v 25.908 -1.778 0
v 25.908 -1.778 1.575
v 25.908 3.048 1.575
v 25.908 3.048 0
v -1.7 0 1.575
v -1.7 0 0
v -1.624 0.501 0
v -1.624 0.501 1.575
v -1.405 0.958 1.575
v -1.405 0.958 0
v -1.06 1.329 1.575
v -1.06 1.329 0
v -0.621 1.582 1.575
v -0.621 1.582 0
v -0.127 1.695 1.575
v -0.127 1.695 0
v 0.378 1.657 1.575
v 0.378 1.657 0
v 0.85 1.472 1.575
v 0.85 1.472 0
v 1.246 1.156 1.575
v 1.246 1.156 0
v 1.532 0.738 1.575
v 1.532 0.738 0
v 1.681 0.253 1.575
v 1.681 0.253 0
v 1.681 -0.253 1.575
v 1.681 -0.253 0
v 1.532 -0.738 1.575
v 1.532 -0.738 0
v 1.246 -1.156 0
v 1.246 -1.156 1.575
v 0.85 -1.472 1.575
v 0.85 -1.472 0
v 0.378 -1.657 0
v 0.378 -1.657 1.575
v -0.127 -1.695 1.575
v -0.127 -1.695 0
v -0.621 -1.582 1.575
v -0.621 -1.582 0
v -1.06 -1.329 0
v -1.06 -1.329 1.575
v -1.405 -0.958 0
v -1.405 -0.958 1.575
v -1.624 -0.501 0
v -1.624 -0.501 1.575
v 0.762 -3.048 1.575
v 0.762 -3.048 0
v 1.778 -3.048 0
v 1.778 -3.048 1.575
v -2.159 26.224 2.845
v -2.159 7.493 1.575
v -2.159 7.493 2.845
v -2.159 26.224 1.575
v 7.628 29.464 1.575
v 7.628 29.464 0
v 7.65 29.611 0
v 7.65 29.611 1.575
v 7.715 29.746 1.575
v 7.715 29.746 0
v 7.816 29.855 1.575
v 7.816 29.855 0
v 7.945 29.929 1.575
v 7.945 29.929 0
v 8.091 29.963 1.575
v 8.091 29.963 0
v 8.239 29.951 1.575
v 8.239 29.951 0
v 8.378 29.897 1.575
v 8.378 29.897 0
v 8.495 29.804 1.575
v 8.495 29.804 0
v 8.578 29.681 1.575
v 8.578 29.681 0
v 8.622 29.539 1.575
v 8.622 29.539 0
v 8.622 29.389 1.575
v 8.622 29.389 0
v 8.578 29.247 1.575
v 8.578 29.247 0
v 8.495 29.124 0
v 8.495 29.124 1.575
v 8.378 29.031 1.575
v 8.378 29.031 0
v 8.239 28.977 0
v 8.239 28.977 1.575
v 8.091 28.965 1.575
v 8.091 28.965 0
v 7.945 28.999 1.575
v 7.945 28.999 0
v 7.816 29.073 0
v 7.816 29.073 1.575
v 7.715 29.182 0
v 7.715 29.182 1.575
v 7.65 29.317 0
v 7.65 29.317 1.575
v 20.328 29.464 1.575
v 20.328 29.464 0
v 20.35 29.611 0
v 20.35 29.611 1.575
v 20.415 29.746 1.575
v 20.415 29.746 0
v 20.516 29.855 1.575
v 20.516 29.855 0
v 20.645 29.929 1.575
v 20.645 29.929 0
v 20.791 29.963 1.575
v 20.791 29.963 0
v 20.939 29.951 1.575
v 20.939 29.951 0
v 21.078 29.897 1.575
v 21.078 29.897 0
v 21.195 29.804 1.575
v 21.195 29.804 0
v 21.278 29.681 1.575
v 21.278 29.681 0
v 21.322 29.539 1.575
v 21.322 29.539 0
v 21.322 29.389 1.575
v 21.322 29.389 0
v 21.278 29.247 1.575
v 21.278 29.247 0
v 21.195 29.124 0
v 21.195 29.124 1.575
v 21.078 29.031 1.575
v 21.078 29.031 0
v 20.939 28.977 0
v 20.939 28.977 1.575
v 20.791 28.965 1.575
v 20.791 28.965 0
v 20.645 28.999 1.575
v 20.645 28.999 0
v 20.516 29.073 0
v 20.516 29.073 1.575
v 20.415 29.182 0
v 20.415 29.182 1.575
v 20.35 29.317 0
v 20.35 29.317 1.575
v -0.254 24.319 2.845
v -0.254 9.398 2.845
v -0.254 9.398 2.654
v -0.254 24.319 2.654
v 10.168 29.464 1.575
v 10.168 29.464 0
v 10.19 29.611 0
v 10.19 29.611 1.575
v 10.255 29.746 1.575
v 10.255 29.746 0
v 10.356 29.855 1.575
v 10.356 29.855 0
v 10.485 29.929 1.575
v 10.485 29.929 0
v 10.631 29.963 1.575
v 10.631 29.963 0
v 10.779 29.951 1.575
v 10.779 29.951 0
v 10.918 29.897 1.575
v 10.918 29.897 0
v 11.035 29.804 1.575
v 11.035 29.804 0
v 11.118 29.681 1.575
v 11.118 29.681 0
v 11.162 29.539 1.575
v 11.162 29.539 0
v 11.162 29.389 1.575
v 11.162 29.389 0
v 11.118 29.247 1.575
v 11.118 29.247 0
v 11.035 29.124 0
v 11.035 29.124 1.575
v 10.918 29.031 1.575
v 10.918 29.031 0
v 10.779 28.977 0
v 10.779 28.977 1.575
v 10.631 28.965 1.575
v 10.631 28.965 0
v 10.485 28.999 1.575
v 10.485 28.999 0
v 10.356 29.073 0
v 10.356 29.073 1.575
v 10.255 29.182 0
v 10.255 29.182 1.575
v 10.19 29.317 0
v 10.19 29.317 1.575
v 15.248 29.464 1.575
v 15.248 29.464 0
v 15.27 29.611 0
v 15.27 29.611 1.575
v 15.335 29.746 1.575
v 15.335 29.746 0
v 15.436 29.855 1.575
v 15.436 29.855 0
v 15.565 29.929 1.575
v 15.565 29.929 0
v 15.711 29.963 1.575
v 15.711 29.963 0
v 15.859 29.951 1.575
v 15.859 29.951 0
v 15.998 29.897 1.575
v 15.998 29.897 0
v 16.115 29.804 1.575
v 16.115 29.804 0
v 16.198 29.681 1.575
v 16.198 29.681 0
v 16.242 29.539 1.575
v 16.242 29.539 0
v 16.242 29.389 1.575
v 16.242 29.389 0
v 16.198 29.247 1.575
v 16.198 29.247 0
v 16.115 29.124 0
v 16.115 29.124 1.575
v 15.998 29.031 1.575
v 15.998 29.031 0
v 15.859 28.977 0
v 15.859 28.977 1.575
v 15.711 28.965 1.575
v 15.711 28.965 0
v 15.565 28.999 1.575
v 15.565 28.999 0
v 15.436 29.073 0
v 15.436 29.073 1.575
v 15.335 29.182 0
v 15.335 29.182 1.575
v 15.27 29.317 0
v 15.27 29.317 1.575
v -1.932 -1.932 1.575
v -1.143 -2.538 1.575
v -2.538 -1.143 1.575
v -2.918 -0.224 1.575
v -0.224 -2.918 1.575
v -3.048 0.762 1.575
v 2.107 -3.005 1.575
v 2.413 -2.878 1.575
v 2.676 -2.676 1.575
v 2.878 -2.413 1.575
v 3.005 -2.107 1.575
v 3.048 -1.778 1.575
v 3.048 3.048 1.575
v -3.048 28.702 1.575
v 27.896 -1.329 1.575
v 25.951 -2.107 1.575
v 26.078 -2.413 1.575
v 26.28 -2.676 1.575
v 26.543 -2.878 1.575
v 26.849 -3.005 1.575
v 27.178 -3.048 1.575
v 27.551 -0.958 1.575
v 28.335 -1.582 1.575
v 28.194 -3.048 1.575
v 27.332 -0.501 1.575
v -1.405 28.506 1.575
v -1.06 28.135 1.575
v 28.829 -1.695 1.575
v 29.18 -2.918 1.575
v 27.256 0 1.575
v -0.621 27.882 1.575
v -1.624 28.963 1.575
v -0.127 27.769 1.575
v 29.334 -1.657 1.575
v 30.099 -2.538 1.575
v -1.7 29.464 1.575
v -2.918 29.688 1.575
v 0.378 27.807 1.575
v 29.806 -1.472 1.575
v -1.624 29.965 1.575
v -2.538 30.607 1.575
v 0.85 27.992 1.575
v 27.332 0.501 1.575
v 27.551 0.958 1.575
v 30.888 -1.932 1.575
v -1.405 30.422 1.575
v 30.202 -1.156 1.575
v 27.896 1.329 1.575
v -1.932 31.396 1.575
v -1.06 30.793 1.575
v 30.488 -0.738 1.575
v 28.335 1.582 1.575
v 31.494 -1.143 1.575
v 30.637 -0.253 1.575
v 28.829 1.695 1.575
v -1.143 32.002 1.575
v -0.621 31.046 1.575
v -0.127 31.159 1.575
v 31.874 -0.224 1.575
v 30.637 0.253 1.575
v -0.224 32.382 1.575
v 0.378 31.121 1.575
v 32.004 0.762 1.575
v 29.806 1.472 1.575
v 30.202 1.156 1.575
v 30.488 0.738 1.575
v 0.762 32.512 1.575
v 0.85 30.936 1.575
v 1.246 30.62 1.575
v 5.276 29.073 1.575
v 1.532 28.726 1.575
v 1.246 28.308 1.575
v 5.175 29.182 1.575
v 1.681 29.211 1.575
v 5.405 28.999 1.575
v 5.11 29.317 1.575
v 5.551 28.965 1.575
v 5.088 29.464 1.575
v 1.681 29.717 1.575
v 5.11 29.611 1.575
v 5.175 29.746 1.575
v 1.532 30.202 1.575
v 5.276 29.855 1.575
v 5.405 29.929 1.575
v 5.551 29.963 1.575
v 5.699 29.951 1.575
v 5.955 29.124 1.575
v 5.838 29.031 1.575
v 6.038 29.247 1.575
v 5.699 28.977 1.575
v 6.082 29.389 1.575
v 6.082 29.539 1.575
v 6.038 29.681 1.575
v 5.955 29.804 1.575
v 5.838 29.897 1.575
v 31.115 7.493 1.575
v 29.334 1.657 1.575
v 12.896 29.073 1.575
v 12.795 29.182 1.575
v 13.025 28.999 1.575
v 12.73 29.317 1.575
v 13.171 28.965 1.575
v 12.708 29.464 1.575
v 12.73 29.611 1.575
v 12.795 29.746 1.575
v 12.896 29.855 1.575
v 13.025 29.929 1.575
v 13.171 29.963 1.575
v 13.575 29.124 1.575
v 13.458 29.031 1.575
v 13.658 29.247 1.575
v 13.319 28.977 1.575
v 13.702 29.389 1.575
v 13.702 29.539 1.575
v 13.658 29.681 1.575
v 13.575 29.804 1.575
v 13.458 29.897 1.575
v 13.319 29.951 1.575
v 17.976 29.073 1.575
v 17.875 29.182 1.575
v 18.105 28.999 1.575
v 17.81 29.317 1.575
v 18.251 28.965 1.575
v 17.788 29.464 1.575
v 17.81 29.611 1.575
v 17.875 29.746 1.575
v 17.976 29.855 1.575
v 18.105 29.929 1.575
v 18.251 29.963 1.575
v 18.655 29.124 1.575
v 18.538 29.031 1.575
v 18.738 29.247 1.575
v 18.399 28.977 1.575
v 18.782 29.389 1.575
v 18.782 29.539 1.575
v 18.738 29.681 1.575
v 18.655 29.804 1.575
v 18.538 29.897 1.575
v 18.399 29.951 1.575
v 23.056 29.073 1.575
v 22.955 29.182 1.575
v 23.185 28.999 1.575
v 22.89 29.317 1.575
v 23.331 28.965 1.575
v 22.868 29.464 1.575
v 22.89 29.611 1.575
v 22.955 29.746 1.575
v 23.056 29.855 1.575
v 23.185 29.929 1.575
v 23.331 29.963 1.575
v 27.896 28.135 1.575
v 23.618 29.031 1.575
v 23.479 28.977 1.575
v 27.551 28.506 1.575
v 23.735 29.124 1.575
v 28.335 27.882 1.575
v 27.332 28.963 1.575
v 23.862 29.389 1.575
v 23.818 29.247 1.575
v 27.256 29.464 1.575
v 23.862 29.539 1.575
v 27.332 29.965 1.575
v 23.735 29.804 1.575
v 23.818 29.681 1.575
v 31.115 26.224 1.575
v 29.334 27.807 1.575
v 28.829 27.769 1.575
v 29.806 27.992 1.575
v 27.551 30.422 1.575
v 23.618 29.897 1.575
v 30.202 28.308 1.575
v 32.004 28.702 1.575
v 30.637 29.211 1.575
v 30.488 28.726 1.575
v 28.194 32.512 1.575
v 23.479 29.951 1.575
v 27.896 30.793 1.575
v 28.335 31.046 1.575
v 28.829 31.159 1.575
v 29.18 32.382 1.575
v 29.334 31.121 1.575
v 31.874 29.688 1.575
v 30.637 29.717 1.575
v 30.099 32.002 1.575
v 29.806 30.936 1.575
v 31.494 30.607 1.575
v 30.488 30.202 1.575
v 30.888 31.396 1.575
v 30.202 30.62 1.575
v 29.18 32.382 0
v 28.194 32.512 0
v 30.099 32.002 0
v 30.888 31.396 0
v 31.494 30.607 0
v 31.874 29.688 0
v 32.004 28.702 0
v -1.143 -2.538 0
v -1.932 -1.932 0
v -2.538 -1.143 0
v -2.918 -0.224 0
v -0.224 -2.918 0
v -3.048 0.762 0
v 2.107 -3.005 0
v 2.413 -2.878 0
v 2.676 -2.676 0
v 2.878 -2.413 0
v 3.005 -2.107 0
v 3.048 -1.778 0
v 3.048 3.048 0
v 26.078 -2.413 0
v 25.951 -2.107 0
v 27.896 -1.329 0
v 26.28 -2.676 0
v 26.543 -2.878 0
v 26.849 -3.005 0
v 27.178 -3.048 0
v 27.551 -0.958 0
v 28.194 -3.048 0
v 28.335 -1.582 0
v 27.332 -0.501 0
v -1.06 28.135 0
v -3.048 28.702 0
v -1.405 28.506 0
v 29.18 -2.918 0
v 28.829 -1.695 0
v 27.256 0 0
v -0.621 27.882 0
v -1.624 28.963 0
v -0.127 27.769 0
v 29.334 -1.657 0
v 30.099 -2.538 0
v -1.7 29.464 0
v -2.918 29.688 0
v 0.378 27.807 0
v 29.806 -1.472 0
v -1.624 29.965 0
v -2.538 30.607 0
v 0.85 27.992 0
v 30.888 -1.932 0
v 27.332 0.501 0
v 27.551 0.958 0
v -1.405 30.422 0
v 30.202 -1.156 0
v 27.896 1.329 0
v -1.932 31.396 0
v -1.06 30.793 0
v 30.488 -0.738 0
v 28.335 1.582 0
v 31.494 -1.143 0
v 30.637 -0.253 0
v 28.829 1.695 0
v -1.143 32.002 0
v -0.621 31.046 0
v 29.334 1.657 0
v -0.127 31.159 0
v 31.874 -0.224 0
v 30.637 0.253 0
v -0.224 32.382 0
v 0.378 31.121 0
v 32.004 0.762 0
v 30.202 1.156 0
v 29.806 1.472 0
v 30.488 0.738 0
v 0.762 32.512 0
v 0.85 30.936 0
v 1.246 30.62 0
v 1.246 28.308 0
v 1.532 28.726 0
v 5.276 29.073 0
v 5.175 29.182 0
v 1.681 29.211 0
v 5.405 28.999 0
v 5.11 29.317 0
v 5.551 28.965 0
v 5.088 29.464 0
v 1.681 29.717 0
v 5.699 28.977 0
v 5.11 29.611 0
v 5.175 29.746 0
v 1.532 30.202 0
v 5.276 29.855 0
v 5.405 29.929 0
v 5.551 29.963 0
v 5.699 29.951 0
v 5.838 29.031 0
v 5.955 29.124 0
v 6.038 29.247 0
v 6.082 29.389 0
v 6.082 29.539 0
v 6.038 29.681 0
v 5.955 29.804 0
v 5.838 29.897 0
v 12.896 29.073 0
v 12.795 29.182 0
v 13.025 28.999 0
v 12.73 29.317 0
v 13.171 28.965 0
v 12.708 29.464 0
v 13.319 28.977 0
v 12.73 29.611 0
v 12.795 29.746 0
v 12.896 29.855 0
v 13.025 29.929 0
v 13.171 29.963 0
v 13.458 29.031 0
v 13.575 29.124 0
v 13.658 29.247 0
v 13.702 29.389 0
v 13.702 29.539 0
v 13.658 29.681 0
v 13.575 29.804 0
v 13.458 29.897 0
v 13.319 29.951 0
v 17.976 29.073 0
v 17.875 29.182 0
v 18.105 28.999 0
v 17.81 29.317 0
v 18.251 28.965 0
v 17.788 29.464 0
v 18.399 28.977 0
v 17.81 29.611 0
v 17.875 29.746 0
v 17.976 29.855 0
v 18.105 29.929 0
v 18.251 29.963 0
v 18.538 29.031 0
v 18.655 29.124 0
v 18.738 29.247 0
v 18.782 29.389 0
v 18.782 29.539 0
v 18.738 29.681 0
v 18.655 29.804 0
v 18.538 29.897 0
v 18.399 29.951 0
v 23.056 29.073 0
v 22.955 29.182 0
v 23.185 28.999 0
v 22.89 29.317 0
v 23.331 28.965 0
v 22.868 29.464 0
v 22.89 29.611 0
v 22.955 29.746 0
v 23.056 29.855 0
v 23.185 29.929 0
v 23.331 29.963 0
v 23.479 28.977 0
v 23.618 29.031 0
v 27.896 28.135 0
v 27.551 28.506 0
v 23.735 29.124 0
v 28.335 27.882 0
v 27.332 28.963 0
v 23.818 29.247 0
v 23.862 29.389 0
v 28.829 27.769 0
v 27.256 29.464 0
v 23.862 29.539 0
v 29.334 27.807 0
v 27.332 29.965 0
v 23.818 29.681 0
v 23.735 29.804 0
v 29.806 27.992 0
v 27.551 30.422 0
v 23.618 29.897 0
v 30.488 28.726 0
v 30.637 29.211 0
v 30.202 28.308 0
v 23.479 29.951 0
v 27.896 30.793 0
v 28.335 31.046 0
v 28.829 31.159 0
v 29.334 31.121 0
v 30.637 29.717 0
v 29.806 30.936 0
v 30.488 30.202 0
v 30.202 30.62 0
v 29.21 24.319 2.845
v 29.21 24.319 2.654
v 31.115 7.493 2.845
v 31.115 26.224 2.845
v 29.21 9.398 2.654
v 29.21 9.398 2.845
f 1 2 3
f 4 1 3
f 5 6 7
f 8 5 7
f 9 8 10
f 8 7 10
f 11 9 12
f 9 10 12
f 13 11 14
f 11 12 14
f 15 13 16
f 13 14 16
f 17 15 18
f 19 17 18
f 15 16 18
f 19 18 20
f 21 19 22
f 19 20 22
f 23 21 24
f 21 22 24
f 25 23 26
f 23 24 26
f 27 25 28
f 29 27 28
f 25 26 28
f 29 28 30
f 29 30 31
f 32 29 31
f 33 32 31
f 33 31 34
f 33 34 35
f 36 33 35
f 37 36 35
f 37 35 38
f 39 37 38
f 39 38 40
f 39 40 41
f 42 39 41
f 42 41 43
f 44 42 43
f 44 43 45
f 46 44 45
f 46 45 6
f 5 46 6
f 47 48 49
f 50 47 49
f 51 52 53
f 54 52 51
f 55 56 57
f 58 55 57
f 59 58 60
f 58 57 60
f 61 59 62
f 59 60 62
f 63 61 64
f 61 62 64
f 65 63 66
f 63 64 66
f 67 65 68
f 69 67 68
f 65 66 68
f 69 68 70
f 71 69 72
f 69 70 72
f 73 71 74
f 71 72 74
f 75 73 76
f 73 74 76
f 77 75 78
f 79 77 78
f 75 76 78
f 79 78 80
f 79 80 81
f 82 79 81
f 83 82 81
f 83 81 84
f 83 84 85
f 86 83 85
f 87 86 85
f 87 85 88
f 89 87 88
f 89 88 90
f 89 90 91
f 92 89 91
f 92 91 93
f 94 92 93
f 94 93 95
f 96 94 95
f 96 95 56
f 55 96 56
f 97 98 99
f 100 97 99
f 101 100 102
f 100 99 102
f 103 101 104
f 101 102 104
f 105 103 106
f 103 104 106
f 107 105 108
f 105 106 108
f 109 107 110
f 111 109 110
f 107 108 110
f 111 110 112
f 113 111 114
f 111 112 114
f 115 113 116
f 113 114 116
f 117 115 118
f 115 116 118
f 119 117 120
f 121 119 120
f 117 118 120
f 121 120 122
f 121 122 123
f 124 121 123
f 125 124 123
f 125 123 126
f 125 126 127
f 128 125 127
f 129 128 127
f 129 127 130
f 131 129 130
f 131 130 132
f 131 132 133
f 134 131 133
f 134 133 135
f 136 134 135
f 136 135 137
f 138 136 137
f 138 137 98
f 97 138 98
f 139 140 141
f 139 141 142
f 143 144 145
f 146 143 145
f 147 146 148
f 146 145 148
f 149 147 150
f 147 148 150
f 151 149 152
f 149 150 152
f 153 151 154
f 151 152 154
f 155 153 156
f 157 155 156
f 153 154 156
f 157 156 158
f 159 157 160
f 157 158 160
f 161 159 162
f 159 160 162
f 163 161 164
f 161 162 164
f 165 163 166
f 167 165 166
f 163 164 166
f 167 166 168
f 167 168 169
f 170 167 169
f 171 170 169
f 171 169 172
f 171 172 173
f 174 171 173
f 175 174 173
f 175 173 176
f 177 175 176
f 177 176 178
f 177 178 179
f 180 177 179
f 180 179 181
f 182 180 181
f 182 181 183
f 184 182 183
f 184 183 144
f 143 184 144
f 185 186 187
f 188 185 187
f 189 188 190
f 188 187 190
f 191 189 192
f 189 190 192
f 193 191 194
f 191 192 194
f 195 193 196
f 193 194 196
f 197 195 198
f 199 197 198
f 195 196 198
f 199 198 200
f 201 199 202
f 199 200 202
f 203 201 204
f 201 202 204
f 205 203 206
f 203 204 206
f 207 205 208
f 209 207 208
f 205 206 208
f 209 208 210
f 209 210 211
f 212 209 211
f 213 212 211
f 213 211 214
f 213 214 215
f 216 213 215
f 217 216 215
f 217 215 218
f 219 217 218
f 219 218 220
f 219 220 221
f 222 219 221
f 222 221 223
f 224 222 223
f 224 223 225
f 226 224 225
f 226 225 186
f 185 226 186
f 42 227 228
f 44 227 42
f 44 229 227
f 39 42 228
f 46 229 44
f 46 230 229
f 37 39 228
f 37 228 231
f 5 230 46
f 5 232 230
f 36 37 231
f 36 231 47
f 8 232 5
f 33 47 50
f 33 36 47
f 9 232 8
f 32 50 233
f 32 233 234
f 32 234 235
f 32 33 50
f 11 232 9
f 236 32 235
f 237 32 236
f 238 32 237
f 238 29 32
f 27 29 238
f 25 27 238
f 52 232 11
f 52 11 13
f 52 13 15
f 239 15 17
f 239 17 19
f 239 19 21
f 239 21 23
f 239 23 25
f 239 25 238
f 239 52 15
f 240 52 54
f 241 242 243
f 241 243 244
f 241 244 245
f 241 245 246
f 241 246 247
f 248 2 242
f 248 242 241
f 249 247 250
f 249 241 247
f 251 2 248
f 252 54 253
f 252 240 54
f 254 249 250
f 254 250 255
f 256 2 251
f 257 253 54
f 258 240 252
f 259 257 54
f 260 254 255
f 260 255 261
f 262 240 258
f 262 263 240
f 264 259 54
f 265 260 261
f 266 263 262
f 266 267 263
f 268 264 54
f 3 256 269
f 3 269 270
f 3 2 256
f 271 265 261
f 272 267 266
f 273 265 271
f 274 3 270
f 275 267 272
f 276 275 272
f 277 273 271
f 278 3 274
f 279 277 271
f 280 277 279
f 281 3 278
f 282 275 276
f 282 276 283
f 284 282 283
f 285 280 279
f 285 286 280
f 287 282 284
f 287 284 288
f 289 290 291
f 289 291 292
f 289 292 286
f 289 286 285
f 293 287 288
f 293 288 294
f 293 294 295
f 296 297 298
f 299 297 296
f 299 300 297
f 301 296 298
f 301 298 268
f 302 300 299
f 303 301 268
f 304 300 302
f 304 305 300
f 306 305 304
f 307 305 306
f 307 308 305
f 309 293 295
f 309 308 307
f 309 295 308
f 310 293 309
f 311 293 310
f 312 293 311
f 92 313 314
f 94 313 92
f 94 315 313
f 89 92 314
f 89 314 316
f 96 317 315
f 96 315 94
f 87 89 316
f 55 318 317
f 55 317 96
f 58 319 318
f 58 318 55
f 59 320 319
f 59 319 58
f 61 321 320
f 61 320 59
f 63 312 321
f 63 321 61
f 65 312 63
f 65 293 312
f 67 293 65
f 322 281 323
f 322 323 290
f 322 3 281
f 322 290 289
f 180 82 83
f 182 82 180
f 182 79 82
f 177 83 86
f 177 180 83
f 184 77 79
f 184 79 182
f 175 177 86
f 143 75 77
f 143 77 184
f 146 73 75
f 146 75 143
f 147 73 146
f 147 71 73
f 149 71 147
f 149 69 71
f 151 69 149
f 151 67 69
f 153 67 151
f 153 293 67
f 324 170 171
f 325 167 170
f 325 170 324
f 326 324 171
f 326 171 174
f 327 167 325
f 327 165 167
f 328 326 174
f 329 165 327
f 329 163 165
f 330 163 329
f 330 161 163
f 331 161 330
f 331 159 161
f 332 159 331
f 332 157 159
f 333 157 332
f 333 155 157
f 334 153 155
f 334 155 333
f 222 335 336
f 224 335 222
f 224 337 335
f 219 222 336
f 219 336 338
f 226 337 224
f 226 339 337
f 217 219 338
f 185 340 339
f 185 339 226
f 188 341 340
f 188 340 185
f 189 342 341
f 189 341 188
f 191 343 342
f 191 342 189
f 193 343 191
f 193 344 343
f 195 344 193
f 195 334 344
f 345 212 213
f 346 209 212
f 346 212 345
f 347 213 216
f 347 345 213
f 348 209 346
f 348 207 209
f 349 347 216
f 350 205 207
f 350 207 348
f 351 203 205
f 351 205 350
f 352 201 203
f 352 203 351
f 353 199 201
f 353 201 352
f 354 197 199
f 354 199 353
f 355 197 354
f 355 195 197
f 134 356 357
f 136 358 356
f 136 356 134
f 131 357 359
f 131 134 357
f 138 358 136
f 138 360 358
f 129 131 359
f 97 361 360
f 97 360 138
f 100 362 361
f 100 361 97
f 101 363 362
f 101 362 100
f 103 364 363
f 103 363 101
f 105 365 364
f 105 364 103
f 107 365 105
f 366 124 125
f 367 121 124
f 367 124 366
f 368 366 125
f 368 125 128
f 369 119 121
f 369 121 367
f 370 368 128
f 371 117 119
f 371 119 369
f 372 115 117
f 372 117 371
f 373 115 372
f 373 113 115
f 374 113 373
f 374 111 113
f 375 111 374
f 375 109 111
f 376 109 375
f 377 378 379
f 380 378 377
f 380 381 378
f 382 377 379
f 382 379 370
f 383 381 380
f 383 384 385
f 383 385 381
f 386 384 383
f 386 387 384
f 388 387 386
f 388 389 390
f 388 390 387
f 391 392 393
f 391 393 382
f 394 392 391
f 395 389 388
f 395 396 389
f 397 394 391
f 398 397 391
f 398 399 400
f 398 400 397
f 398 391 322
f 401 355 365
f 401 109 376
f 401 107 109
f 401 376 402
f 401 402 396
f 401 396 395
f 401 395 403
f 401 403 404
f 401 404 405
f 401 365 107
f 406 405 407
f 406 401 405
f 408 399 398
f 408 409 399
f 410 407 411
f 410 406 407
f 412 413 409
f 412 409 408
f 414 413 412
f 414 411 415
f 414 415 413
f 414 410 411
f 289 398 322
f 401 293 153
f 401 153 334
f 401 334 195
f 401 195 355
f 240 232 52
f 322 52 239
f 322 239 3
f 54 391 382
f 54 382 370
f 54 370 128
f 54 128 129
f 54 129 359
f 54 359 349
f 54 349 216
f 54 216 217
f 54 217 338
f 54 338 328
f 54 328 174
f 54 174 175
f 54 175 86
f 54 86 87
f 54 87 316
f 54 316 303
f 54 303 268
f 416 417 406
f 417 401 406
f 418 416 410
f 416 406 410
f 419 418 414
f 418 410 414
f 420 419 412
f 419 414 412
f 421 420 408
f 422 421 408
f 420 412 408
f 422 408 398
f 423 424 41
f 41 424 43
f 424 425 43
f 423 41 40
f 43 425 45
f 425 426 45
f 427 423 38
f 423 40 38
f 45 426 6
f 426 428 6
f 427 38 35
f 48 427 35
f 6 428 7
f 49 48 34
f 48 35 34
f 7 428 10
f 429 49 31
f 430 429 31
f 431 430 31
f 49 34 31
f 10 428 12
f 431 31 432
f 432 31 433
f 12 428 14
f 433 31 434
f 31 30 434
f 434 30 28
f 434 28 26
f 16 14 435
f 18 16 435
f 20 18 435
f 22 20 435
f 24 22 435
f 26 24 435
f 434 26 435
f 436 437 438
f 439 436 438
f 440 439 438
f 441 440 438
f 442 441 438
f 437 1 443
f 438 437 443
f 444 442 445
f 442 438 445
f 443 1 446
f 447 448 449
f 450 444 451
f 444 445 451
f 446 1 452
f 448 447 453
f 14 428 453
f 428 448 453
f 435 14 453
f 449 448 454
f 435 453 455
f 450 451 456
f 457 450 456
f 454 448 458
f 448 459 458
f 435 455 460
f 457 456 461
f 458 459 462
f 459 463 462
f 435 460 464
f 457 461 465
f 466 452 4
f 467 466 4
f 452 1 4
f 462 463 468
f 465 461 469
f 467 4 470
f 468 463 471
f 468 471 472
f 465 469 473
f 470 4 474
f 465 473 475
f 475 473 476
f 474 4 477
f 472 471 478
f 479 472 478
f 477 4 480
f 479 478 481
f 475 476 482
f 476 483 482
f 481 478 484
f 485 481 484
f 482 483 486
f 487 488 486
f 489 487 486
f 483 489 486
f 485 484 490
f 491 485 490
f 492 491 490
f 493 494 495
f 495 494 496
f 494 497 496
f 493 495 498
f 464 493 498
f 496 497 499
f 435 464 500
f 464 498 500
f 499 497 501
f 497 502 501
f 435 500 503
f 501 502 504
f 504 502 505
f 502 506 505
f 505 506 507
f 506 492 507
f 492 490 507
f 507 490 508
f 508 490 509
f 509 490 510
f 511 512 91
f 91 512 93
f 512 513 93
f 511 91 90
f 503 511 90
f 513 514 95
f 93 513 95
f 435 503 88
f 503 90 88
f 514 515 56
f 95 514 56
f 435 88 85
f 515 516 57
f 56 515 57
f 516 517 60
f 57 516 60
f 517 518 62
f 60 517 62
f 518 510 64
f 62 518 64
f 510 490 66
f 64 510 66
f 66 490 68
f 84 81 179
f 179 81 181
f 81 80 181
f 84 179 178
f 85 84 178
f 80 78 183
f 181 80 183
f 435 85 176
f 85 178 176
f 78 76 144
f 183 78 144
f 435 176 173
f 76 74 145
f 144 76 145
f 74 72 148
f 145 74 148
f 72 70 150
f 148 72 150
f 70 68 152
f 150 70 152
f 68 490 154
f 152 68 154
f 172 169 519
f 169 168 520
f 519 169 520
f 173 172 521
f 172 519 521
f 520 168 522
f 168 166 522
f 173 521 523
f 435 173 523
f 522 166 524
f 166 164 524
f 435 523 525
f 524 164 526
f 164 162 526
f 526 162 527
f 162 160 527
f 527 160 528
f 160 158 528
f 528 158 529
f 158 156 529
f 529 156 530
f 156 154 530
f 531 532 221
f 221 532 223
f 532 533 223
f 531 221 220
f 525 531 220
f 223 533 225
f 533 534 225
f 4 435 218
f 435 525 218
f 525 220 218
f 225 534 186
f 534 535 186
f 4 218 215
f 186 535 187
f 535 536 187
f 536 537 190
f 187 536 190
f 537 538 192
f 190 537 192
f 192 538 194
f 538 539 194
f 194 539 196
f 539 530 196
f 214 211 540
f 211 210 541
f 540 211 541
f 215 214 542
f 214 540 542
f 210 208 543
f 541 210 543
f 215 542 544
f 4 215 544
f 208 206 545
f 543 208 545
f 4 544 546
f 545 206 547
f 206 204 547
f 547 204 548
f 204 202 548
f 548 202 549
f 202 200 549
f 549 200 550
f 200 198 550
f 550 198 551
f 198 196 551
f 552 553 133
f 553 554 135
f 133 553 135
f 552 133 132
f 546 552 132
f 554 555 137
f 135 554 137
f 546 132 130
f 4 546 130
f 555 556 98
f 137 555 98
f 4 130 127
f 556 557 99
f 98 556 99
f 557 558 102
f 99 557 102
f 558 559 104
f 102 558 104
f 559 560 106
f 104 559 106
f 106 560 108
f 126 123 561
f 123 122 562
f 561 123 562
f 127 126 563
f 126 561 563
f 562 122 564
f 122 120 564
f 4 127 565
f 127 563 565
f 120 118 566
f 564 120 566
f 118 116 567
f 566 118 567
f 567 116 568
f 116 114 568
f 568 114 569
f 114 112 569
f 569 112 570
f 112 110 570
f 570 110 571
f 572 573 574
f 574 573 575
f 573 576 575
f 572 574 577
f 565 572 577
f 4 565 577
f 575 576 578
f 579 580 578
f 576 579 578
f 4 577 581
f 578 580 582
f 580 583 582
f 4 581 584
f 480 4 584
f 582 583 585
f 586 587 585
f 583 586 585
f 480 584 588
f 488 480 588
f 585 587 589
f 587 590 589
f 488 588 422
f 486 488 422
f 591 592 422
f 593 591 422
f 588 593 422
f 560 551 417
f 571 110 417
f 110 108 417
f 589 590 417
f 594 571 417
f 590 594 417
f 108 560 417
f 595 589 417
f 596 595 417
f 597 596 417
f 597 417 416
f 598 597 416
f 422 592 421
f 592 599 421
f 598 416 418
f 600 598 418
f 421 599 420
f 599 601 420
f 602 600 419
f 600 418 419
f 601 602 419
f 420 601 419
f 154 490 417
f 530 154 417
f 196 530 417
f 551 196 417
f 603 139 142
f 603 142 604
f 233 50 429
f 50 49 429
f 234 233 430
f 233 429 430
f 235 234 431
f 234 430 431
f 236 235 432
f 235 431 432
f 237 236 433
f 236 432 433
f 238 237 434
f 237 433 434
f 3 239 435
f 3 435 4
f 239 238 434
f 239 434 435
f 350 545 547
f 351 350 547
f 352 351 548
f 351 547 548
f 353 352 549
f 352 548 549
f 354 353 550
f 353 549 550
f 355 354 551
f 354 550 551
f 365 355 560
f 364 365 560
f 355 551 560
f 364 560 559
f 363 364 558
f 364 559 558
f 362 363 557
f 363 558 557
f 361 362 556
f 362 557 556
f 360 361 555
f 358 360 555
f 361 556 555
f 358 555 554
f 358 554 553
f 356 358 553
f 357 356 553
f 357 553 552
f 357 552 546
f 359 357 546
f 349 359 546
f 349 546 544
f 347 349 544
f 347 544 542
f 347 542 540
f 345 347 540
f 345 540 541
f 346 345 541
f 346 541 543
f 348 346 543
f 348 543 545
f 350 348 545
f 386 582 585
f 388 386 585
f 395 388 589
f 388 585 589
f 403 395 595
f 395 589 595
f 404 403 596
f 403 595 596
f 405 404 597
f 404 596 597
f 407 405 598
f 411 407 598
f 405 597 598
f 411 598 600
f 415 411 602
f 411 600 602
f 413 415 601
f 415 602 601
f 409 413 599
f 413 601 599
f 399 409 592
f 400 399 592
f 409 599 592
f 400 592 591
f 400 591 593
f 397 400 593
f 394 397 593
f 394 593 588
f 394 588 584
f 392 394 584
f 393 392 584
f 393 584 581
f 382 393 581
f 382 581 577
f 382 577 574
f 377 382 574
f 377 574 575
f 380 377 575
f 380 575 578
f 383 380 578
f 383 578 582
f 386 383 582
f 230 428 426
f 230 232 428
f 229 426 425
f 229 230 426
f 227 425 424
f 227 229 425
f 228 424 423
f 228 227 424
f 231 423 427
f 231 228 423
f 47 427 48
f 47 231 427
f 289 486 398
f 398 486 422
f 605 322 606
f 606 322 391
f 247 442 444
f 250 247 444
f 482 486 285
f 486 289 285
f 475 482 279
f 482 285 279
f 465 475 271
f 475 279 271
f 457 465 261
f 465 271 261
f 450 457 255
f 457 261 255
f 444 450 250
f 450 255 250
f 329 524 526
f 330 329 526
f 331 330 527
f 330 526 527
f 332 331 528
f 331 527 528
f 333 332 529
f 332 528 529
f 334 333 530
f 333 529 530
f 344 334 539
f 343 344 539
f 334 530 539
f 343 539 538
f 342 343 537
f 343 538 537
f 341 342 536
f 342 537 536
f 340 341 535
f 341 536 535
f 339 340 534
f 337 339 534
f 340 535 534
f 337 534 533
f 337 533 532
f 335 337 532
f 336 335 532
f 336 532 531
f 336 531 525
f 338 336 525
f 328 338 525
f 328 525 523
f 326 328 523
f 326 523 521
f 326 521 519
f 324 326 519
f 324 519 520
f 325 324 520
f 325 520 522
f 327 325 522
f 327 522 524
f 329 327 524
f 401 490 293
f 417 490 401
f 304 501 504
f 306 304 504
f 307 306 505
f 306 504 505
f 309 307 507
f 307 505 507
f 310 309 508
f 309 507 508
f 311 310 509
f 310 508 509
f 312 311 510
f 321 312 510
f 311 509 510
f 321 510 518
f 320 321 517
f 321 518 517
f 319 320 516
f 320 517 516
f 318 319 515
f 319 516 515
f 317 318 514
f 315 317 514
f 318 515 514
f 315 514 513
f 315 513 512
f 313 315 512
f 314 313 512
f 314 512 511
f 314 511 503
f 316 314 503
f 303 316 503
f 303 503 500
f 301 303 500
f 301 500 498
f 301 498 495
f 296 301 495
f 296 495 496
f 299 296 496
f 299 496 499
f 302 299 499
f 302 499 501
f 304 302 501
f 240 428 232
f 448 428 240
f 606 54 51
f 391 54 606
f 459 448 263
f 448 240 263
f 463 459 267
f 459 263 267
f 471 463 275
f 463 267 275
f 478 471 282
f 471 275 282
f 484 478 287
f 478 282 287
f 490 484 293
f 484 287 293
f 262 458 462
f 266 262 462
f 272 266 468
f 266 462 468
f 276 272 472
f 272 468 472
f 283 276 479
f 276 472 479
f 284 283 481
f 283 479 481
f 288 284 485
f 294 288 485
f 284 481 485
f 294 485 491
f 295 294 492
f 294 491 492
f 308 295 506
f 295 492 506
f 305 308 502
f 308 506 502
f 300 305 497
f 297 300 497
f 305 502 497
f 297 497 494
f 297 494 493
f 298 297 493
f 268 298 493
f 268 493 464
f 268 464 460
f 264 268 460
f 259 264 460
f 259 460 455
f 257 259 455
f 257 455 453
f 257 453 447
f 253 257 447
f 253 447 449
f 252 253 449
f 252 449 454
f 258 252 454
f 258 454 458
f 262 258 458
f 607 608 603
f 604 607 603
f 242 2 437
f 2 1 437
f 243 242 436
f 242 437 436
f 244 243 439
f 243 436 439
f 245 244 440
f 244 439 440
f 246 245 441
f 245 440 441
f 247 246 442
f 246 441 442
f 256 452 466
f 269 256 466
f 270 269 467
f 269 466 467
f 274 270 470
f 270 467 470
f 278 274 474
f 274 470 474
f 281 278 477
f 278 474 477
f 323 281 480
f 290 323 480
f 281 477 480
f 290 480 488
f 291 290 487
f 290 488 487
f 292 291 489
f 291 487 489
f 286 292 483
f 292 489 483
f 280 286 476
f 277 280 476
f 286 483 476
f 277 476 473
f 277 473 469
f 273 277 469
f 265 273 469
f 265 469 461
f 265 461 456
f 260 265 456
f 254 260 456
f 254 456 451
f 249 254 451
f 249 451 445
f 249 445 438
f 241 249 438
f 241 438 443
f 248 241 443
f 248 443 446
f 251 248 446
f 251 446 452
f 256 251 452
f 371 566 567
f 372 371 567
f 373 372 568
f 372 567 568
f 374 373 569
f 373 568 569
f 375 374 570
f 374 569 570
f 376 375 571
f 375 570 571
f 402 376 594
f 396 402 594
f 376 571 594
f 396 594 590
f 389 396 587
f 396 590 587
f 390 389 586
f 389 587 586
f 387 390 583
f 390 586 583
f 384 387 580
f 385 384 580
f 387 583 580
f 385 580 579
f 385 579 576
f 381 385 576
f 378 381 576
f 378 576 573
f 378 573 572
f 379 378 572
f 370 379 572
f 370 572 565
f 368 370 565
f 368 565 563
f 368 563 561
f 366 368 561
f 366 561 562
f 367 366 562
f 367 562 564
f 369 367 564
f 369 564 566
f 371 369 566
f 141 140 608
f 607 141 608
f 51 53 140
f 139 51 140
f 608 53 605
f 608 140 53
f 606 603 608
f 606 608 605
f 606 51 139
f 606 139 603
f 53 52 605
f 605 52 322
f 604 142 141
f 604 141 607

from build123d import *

# Parameters (mm, degrees)
SKETCH2_W                = 35.052
SKETCH2_H                = 35.56
BOSS_EXTRUDE1_DEPTH      = 1.5748
CUT_EXTRUDE4_START       = 1.5748
SKETCH2_8_W              = 22.86
SKETCH2_8_H              = 6.096
CUT_EXTRUDE4_DEPTH       = 1.5748
M3_CLEARANCE_HOLE1_D     = 3.4
F_1_0_1_DIAMETER_HOLE1_D = 1
FILLET2_R                = 3.81
FILLET3_R                = 1.27
SKETCH10_W               = 33.274
SKETCH10_H               = 18.731056846
BOSS_EXTRUDE2_DEPTH      = 1.27
SKETCH11_W               = 29.464
SKETCH11_H               = 14.921056846
CUT_EXTRUDE5_DEPTH       = 0.1905


with BuildPart() as part:
    # Sketch2 → Boss-Extrude1 (new body)
    with BuildSketch(Plane.XY):
        with Locations((14.478, 14.732)):
            Rectangle(SKETCH2_W, SKETCH2_H)
    extrude(amount=BOSS_EXTRUDE1_DEPTH)

    # Sketch2<8> → Cut-Extrude4 (cut)
    with BuildSketch(Plane.XY.offset(CUT_EXTRUDE4_START)):
        with Locations((14.478, 0)):
            Rectangle(SKETCH2_8_W, SKETCH2_8_H)
    extrude(amount=-CUT_EXTRUDE4_DEPTH, mode=Mode.SUBTRACT)

    # M3 Clearance Hole1 (through all)
    with Locations(Plane.XY.offset(1.5748)):
        with Locations((0, 29.464), (0, 0), (28.956, 0), (28.956, 29.464)):
            Hole(M3_CLEARANCE_HOLE1_D / 2)

    # Ø1.0 (1) Diameter Hole1 (through all)
    with Locations(Plane.XY.offset(1.5748)):
        with Locations((5.588, 29.464), (8.128, 29.464), (10.668, 29.464), (13.208, 29.464), (15.748, 29.464), (18.288, 29.464), (20.828, 29.464), (23.368, 29.464)):
            Hole(F_1_0_1_DIAMETER_HOLE1_D / 2)

    # Fillet2
    fillet2_edges = [part.edges().sort_by_distance(p)[0] for p in [
        (-3.048, 32.512, 0.7874),
        (-3.048, -3.048, 0.7874),
        (32.004, -3.048, 0.7874),
        (32.004, 32.512, 0.7874),
    ]]
    fillet(fillet2_edges, radius=FILLET2_R)

    # Fillet3
    fillet3_edges = [part.edges().sort_by_distance(p)[0] for p in [
        (25.908, -3.048, 0.7874),
        (3.048, -3.048, 0.7874),
    ]]
    fillet(fillet3_edges, radius=FILLET3_R)

    # Sketch10 → Boss-Extrude2 (add)
    with BuildSketch(Plane.XY.offset(1.5748)):
        with Locations((14.478, 16.858528423)):
            Rectangle(SKETCH10_W, SKETCH10_H)
    extrude(amount=BOSS_EXTRUDE2_DEPTH)

    # Sketch11 → Cut-Extrude5 (cut)
    with BuildSketch(Plane.XY.offset(2.8448)):
        with Locations((14.478, 16.858528423)):
            Rectangle(SKETCH11_W, SKETCH11_H)
    extrude(amount=-CUT_EXTRUDE5_DEPTH, mode=Mode.SUBTRACT)


solid = part.part
